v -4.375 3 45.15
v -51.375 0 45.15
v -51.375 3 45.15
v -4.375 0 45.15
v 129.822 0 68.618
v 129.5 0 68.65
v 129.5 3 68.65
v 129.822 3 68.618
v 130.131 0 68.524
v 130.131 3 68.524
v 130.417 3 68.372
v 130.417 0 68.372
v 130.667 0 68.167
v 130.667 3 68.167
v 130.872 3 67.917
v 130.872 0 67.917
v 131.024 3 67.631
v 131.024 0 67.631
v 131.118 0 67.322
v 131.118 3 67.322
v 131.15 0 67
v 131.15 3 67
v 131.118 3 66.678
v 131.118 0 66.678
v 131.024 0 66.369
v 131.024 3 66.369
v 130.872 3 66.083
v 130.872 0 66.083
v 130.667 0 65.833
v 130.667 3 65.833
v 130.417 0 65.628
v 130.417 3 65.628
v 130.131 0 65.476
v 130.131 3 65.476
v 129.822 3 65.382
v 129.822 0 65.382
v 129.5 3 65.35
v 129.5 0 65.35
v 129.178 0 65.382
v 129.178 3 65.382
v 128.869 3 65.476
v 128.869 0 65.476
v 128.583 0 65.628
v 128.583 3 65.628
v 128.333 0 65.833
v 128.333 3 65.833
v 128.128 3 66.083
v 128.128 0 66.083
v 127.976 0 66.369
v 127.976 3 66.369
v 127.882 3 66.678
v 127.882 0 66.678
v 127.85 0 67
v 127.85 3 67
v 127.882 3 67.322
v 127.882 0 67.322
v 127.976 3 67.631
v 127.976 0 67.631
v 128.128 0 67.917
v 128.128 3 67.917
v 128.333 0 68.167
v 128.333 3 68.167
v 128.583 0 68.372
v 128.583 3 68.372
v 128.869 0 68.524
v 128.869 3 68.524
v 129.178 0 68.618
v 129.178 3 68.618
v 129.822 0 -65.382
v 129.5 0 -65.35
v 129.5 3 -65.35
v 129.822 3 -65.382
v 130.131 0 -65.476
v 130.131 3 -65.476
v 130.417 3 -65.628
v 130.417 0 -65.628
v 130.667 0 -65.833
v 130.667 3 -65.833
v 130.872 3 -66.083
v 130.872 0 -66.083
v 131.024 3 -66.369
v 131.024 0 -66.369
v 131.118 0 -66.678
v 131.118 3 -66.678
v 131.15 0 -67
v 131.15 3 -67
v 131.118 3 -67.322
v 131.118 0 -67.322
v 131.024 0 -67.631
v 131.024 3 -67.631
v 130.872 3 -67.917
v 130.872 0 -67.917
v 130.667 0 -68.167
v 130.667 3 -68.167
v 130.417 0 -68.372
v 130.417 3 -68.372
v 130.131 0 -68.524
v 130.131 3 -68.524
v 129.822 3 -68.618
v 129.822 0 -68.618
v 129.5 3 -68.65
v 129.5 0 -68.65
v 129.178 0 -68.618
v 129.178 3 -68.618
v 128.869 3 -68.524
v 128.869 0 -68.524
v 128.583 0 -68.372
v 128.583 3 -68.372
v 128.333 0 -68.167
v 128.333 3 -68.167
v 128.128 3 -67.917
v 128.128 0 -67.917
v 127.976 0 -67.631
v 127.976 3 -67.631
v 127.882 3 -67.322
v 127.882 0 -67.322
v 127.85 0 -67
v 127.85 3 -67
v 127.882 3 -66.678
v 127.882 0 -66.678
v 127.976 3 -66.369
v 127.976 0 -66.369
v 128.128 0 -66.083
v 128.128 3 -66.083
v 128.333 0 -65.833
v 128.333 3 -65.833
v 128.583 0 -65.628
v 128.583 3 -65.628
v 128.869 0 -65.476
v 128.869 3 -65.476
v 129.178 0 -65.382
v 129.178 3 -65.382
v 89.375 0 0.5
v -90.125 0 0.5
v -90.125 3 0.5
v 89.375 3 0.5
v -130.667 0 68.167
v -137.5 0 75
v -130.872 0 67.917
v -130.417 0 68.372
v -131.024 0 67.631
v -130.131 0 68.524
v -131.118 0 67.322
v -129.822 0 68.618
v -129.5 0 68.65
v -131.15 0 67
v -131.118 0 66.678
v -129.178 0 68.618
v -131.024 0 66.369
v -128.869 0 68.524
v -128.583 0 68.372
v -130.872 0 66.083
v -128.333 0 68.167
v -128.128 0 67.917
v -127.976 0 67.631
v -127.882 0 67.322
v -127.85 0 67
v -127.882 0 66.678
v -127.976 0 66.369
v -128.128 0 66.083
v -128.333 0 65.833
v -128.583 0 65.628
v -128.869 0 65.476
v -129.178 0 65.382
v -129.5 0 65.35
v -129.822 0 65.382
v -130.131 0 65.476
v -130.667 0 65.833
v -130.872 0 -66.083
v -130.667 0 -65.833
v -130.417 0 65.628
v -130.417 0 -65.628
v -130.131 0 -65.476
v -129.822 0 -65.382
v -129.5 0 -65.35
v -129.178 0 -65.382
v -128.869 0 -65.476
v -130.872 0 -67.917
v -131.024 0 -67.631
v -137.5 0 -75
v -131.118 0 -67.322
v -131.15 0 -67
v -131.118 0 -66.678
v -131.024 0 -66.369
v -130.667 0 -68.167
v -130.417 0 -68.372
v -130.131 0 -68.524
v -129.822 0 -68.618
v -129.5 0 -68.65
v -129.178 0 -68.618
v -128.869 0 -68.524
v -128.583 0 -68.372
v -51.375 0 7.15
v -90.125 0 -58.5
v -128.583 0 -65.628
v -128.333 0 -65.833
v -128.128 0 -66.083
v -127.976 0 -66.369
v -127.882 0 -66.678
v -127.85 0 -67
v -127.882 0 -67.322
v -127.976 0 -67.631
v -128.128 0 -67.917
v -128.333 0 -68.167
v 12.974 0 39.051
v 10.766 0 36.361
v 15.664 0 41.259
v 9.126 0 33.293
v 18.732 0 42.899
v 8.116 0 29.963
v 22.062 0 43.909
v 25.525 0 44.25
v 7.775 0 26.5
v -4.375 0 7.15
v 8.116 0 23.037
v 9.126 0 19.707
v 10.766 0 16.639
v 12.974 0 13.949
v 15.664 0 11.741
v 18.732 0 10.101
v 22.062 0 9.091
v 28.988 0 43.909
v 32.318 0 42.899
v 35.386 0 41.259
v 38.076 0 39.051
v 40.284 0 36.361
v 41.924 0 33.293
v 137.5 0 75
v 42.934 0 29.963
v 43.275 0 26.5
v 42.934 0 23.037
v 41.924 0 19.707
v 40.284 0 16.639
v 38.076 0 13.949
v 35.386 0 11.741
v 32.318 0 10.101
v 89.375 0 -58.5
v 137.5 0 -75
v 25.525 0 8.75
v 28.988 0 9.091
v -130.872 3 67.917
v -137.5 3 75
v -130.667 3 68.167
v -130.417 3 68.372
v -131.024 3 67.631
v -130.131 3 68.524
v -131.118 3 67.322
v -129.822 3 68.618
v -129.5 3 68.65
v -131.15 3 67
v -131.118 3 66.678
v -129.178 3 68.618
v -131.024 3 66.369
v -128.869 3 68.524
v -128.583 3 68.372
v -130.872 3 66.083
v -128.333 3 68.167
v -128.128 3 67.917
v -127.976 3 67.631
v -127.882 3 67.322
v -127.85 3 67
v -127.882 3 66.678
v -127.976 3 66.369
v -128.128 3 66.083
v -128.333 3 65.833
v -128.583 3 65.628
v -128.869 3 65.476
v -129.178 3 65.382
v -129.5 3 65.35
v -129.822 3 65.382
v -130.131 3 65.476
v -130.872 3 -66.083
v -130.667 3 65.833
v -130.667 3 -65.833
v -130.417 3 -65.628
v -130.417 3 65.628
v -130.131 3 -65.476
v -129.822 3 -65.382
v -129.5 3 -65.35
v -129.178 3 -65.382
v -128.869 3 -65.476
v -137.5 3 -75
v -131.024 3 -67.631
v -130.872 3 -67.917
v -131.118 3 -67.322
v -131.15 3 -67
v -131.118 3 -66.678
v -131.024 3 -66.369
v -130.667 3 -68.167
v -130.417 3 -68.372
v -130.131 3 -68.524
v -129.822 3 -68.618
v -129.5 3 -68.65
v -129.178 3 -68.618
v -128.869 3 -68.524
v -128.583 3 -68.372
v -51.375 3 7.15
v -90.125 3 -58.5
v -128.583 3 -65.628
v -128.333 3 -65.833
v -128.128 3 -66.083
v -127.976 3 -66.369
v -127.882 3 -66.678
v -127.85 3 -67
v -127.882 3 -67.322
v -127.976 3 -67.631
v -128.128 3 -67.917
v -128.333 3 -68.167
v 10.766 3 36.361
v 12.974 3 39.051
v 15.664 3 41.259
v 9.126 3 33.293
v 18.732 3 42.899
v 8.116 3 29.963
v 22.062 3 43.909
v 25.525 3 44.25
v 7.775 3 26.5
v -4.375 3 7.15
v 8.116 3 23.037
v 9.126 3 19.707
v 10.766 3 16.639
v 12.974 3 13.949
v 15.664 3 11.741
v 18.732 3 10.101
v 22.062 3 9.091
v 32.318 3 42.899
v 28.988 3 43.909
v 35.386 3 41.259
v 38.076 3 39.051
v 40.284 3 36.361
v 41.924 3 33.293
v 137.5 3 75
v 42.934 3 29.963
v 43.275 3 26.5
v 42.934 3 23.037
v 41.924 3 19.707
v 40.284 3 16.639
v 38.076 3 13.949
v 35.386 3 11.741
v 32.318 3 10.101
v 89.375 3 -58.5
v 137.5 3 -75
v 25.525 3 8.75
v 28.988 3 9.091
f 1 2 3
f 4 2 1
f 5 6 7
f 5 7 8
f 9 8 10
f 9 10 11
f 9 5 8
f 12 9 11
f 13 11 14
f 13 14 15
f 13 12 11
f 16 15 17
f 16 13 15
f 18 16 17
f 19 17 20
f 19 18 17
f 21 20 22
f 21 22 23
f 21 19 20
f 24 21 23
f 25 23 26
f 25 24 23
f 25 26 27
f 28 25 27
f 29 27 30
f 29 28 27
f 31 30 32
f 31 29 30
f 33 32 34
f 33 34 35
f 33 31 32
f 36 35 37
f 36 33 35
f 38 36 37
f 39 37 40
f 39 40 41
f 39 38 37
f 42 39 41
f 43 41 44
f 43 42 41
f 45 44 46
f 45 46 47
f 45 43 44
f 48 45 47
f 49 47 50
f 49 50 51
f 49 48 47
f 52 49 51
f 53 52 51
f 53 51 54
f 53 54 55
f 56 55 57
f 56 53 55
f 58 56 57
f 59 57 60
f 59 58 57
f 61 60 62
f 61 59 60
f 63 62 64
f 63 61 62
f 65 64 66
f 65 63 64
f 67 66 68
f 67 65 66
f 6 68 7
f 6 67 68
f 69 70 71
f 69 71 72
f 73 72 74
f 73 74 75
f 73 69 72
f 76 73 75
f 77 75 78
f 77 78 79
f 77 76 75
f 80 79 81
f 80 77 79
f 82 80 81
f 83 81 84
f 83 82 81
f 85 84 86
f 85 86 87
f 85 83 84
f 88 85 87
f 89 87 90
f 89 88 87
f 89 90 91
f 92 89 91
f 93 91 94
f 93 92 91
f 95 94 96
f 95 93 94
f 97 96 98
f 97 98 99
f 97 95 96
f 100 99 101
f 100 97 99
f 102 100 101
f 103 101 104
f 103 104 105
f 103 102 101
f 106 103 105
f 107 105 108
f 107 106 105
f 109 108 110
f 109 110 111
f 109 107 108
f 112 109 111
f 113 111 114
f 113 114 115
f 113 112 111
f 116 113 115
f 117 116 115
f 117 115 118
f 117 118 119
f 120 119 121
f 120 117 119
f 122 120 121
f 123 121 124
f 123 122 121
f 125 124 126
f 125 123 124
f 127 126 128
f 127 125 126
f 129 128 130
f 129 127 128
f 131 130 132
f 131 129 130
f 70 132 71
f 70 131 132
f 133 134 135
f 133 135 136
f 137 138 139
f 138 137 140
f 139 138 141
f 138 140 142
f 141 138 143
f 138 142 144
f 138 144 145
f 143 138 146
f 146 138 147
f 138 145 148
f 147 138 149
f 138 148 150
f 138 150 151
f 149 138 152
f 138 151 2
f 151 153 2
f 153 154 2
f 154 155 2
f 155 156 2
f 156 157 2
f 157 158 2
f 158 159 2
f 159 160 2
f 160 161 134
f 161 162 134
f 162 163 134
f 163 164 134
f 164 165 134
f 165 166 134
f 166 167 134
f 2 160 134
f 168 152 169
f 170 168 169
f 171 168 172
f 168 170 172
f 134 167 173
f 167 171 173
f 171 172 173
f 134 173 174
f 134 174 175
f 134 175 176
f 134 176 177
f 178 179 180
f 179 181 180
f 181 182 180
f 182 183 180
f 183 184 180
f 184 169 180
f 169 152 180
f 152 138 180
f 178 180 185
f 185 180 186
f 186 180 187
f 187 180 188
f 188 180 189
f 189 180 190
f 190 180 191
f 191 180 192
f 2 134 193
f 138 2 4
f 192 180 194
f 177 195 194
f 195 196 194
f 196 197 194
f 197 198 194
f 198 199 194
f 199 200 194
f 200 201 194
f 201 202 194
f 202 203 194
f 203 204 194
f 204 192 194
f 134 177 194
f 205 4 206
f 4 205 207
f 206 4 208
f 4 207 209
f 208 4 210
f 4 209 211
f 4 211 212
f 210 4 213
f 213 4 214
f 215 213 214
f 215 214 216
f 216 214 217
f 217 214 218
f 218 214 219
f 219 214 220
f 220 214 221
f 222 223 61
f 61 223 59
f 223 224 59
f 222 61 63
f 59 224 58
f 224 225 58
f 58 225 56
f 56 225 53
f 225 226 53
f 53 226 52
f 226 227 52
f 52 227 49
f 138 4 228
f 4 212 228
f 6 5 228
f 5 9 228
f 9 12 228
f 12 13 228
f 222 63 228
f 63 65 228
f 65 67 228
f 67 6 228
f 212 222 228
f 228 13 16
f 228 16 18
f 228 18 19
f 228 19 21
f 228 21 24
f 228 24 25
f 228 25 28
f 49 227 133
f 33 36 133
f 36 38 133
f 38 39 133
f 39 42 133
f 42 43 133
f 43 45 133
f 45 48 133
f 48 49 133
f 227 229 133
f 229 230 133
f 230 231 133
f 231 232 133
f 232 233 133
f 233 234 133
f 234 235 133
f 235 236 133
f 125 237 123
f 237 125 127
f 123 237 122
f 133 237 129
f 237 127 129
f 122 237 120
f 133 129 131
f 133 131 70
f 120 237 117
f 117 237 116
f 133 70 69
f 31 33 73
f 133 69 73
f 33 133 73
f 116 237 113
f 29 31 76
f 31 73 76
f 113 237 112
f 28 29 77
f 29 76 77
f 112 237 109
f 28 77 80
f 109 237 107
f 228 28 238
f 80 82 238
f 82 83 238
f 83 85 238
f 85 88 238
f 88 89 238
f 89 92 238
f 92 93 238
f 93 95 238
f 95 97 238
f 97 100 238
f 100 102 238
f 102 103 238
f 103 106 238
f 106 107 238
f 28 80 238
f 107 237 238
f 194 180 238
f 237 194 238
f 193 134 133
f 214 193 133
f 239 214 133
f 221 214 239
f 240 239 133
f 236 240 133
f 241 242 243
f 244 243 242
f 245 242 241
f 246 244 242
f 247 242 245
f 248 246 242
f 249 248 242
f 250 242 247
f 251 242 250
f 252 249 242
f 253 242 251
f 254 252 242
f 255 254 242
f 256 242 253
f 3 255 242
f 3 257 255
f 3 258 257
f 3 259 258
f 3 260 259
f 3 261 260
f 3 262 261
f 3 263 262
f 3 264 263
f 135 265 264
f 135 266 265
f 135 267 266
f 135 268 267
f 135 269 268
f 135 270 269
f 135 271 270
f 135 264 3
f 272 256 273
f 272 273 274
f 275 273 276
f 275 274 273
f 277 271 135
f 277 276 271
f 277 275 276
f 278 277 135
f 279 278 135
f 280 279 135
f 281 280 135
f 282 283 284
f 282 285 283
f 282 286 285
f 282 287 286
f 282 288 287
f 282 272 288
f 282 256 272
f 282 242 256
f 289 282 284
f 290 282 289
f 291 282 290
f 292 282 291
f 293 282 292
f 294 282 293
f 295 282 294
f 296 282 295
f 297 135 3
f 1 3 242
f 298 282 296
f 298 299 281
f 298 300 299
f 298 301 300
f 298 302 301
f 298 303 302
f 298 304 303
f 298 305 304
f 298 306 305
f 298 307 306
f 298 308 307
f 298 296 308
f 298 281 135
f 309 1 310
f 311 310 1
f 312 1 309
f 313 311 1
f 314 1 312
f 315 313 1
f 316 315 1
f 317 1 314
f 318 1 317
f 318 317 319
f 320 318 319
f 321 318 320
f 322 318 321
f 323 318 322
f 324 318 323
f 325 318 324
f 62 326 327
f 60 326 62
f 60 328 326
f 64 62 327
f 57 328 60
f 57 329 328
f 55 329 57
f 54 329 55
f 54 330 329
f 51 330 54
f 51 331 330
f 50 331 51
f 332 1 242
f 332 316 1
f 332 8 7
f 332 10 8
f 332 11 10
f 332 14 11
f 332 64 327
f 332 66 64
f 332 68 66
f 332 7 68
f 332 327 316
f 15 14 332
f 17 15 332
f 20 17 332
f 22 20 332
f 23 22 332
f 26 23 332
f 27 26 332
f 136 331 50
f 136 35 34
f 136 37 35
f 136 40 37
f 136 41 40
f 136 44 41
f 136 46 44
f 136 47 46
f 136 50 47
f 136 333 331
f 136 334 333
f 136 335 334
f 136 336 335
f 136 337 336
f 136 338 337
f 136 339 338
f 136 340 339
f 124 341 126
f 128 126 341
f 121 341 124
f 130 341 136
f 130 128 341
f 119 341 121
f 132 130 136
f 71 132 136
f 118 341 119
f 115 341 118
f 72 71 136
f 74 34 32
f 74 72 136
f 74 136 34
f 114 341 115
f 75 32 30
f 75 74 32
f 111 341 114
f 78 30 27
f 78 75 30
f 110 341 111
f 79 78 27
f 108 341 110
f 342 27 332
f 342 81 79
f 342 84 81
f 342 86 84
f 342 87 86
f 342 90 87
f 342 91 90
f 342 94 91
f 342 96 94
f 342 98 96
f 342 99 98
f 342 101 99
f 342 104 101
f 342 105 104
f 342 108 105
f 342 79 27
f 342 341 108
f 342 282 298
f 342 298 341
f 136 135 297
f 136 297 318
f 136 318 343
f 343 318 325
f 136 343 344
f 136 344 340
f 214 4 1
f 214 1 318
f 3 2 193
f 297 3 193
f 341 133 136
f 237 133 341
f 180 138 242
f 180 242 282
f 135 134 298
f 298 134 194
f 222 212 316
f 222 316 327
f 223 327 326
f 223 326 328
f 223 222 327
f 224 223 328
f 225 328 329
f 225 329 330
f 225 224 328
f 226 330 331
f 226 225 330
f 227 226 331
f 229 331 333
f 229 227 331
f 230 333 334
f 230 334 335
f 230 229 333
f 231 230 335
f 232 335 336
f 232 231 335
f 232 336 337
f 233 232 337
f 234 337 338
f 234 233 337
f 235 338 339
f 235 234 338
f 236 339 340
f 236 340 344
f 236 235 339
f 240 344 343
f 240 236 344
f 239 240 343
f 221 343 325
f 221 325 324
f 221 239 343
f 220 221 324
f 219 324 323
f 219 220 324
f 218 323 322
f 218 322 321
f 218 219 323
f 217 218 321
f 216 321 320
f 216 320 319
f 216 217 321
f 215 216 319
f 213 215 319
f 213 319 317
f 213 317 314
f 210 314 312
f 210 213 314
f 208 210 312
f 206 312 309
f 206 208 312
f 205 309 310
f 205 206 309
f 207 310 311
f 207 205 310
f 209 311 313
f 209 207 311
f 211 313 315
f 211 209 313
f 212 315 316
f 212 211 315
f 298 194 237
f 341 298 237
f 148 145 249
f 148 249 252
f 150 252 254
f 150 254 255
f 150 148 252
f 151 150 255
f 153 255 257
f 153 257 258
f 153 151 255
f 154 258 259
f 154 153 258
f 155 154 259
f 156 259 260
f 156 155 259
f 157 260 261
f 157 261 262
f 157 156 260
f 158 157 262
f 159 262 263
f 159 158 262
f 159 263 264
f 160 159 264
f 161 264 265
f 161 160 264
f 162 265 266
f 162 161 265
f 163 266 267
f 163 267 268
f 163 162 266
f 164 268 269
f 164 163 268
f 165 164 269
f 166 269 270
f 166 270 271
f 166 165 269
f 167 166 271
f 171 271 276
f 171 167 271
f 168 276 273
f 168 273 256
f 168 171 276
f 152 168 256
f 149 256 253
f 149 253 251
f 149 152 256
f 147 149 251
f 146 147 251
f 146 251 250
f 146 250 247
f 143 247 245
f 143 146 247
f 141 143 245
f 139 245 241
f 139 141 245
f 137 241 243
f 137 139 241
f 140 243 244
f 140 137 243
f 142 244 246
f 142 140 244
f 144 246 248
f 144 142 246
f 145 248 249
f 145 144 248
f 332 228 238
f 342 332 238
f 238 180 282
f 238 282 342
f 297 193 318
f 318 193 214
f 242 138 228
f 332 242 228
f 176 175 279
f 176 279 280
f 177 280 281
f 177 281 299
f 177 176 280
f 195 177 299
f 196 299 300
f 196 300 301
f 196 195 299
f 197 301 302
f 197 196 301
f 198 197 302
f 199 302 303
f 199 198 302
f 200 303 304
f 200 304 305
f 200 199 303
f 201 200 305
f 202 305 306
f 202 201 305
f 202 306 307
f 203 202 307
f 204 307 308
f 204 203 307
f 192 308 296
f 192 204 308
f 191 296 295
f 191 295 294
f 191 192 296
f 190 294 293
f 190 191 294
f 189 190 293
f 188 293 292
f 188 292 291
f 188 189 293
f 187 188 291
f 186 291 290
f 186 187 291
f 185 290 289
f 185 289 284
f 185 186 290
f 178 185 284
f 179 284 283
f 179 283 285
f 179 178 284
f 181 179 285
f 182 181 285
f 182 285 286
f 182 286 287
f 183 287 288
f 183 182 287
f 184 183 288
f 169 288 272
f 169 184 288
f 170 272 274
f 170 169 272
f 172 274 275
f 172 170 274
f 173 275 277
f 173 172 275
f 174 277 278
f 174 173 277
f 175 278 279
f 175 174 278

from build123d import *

# Parameters (mm, degrees)
SKIZZE1_W                       = 275
SKIZZE1_H                       = 150
SKIZZE1_R                       = 1.65
SKIZZE1_R_2                     = 17.75
SKIZZE1_W_2                     = 179.5
SKIZZE1_H_2                     = 59
SKIZZE1_W_3                     = 47
SKIZZE1_H_3                     = 38
AUFSATZ_LINEAR_AUSTRAGEN1_DEPTH = 3


with BuildPart() as part:
    # Skizze1 → Aufsatz-Linear austragen1 (new body)
    with BuildSketch(Plane(origin=(0, 0, 0), x_dir=(1, 0, 0), z_dir=(0, 1, 0))):
        Rectangle(SKIZZE1_W, SKIZZE1_H)
        with Locations(Location((-129.5, -67, 0), (0, 0, 270))):
            Circle(SKIZZE1_R, mode=Mode.SUBTRACT)
        with Locations(Location((129.5, -67, 0), (0, 0, 270))):
            Circle(SKIZZE1_R, mode=Mode.SUBTRACT)
        with Locations(Location((-129.5, 67, 0), (0, 0, 270))):
            Circle(SKIZZE1_R, mode=Mode.SUBTRACT)
        with Locations(Location((129.5, 67, 0), (0, 0, 270))):
            Circle(SKIZZE1_R, mode=Mode.SUBTRACT)
        with Locations(Location((25.525, -26.5, 0), (0, 0, 270))):
            Circle(SKIZZE1_R_2, mode=Mode.SUBTRACT)
        with Locations((-0.375, 29)):
            Rectangle(SKIZZE1_W_2, SKIZZE1_H_2, mode=Mode.SUBTRACT)
        with Locations((-27.875, -26.15)):
            Rectangle(SKIZZE1_W_3, SKIZZE1_H_3, mode=Mode.SUBTRACT)
    extrude(amount=AUFSATZ_LINEAR_AUSTRAGEN1_DEPTH)


solid = part.part
